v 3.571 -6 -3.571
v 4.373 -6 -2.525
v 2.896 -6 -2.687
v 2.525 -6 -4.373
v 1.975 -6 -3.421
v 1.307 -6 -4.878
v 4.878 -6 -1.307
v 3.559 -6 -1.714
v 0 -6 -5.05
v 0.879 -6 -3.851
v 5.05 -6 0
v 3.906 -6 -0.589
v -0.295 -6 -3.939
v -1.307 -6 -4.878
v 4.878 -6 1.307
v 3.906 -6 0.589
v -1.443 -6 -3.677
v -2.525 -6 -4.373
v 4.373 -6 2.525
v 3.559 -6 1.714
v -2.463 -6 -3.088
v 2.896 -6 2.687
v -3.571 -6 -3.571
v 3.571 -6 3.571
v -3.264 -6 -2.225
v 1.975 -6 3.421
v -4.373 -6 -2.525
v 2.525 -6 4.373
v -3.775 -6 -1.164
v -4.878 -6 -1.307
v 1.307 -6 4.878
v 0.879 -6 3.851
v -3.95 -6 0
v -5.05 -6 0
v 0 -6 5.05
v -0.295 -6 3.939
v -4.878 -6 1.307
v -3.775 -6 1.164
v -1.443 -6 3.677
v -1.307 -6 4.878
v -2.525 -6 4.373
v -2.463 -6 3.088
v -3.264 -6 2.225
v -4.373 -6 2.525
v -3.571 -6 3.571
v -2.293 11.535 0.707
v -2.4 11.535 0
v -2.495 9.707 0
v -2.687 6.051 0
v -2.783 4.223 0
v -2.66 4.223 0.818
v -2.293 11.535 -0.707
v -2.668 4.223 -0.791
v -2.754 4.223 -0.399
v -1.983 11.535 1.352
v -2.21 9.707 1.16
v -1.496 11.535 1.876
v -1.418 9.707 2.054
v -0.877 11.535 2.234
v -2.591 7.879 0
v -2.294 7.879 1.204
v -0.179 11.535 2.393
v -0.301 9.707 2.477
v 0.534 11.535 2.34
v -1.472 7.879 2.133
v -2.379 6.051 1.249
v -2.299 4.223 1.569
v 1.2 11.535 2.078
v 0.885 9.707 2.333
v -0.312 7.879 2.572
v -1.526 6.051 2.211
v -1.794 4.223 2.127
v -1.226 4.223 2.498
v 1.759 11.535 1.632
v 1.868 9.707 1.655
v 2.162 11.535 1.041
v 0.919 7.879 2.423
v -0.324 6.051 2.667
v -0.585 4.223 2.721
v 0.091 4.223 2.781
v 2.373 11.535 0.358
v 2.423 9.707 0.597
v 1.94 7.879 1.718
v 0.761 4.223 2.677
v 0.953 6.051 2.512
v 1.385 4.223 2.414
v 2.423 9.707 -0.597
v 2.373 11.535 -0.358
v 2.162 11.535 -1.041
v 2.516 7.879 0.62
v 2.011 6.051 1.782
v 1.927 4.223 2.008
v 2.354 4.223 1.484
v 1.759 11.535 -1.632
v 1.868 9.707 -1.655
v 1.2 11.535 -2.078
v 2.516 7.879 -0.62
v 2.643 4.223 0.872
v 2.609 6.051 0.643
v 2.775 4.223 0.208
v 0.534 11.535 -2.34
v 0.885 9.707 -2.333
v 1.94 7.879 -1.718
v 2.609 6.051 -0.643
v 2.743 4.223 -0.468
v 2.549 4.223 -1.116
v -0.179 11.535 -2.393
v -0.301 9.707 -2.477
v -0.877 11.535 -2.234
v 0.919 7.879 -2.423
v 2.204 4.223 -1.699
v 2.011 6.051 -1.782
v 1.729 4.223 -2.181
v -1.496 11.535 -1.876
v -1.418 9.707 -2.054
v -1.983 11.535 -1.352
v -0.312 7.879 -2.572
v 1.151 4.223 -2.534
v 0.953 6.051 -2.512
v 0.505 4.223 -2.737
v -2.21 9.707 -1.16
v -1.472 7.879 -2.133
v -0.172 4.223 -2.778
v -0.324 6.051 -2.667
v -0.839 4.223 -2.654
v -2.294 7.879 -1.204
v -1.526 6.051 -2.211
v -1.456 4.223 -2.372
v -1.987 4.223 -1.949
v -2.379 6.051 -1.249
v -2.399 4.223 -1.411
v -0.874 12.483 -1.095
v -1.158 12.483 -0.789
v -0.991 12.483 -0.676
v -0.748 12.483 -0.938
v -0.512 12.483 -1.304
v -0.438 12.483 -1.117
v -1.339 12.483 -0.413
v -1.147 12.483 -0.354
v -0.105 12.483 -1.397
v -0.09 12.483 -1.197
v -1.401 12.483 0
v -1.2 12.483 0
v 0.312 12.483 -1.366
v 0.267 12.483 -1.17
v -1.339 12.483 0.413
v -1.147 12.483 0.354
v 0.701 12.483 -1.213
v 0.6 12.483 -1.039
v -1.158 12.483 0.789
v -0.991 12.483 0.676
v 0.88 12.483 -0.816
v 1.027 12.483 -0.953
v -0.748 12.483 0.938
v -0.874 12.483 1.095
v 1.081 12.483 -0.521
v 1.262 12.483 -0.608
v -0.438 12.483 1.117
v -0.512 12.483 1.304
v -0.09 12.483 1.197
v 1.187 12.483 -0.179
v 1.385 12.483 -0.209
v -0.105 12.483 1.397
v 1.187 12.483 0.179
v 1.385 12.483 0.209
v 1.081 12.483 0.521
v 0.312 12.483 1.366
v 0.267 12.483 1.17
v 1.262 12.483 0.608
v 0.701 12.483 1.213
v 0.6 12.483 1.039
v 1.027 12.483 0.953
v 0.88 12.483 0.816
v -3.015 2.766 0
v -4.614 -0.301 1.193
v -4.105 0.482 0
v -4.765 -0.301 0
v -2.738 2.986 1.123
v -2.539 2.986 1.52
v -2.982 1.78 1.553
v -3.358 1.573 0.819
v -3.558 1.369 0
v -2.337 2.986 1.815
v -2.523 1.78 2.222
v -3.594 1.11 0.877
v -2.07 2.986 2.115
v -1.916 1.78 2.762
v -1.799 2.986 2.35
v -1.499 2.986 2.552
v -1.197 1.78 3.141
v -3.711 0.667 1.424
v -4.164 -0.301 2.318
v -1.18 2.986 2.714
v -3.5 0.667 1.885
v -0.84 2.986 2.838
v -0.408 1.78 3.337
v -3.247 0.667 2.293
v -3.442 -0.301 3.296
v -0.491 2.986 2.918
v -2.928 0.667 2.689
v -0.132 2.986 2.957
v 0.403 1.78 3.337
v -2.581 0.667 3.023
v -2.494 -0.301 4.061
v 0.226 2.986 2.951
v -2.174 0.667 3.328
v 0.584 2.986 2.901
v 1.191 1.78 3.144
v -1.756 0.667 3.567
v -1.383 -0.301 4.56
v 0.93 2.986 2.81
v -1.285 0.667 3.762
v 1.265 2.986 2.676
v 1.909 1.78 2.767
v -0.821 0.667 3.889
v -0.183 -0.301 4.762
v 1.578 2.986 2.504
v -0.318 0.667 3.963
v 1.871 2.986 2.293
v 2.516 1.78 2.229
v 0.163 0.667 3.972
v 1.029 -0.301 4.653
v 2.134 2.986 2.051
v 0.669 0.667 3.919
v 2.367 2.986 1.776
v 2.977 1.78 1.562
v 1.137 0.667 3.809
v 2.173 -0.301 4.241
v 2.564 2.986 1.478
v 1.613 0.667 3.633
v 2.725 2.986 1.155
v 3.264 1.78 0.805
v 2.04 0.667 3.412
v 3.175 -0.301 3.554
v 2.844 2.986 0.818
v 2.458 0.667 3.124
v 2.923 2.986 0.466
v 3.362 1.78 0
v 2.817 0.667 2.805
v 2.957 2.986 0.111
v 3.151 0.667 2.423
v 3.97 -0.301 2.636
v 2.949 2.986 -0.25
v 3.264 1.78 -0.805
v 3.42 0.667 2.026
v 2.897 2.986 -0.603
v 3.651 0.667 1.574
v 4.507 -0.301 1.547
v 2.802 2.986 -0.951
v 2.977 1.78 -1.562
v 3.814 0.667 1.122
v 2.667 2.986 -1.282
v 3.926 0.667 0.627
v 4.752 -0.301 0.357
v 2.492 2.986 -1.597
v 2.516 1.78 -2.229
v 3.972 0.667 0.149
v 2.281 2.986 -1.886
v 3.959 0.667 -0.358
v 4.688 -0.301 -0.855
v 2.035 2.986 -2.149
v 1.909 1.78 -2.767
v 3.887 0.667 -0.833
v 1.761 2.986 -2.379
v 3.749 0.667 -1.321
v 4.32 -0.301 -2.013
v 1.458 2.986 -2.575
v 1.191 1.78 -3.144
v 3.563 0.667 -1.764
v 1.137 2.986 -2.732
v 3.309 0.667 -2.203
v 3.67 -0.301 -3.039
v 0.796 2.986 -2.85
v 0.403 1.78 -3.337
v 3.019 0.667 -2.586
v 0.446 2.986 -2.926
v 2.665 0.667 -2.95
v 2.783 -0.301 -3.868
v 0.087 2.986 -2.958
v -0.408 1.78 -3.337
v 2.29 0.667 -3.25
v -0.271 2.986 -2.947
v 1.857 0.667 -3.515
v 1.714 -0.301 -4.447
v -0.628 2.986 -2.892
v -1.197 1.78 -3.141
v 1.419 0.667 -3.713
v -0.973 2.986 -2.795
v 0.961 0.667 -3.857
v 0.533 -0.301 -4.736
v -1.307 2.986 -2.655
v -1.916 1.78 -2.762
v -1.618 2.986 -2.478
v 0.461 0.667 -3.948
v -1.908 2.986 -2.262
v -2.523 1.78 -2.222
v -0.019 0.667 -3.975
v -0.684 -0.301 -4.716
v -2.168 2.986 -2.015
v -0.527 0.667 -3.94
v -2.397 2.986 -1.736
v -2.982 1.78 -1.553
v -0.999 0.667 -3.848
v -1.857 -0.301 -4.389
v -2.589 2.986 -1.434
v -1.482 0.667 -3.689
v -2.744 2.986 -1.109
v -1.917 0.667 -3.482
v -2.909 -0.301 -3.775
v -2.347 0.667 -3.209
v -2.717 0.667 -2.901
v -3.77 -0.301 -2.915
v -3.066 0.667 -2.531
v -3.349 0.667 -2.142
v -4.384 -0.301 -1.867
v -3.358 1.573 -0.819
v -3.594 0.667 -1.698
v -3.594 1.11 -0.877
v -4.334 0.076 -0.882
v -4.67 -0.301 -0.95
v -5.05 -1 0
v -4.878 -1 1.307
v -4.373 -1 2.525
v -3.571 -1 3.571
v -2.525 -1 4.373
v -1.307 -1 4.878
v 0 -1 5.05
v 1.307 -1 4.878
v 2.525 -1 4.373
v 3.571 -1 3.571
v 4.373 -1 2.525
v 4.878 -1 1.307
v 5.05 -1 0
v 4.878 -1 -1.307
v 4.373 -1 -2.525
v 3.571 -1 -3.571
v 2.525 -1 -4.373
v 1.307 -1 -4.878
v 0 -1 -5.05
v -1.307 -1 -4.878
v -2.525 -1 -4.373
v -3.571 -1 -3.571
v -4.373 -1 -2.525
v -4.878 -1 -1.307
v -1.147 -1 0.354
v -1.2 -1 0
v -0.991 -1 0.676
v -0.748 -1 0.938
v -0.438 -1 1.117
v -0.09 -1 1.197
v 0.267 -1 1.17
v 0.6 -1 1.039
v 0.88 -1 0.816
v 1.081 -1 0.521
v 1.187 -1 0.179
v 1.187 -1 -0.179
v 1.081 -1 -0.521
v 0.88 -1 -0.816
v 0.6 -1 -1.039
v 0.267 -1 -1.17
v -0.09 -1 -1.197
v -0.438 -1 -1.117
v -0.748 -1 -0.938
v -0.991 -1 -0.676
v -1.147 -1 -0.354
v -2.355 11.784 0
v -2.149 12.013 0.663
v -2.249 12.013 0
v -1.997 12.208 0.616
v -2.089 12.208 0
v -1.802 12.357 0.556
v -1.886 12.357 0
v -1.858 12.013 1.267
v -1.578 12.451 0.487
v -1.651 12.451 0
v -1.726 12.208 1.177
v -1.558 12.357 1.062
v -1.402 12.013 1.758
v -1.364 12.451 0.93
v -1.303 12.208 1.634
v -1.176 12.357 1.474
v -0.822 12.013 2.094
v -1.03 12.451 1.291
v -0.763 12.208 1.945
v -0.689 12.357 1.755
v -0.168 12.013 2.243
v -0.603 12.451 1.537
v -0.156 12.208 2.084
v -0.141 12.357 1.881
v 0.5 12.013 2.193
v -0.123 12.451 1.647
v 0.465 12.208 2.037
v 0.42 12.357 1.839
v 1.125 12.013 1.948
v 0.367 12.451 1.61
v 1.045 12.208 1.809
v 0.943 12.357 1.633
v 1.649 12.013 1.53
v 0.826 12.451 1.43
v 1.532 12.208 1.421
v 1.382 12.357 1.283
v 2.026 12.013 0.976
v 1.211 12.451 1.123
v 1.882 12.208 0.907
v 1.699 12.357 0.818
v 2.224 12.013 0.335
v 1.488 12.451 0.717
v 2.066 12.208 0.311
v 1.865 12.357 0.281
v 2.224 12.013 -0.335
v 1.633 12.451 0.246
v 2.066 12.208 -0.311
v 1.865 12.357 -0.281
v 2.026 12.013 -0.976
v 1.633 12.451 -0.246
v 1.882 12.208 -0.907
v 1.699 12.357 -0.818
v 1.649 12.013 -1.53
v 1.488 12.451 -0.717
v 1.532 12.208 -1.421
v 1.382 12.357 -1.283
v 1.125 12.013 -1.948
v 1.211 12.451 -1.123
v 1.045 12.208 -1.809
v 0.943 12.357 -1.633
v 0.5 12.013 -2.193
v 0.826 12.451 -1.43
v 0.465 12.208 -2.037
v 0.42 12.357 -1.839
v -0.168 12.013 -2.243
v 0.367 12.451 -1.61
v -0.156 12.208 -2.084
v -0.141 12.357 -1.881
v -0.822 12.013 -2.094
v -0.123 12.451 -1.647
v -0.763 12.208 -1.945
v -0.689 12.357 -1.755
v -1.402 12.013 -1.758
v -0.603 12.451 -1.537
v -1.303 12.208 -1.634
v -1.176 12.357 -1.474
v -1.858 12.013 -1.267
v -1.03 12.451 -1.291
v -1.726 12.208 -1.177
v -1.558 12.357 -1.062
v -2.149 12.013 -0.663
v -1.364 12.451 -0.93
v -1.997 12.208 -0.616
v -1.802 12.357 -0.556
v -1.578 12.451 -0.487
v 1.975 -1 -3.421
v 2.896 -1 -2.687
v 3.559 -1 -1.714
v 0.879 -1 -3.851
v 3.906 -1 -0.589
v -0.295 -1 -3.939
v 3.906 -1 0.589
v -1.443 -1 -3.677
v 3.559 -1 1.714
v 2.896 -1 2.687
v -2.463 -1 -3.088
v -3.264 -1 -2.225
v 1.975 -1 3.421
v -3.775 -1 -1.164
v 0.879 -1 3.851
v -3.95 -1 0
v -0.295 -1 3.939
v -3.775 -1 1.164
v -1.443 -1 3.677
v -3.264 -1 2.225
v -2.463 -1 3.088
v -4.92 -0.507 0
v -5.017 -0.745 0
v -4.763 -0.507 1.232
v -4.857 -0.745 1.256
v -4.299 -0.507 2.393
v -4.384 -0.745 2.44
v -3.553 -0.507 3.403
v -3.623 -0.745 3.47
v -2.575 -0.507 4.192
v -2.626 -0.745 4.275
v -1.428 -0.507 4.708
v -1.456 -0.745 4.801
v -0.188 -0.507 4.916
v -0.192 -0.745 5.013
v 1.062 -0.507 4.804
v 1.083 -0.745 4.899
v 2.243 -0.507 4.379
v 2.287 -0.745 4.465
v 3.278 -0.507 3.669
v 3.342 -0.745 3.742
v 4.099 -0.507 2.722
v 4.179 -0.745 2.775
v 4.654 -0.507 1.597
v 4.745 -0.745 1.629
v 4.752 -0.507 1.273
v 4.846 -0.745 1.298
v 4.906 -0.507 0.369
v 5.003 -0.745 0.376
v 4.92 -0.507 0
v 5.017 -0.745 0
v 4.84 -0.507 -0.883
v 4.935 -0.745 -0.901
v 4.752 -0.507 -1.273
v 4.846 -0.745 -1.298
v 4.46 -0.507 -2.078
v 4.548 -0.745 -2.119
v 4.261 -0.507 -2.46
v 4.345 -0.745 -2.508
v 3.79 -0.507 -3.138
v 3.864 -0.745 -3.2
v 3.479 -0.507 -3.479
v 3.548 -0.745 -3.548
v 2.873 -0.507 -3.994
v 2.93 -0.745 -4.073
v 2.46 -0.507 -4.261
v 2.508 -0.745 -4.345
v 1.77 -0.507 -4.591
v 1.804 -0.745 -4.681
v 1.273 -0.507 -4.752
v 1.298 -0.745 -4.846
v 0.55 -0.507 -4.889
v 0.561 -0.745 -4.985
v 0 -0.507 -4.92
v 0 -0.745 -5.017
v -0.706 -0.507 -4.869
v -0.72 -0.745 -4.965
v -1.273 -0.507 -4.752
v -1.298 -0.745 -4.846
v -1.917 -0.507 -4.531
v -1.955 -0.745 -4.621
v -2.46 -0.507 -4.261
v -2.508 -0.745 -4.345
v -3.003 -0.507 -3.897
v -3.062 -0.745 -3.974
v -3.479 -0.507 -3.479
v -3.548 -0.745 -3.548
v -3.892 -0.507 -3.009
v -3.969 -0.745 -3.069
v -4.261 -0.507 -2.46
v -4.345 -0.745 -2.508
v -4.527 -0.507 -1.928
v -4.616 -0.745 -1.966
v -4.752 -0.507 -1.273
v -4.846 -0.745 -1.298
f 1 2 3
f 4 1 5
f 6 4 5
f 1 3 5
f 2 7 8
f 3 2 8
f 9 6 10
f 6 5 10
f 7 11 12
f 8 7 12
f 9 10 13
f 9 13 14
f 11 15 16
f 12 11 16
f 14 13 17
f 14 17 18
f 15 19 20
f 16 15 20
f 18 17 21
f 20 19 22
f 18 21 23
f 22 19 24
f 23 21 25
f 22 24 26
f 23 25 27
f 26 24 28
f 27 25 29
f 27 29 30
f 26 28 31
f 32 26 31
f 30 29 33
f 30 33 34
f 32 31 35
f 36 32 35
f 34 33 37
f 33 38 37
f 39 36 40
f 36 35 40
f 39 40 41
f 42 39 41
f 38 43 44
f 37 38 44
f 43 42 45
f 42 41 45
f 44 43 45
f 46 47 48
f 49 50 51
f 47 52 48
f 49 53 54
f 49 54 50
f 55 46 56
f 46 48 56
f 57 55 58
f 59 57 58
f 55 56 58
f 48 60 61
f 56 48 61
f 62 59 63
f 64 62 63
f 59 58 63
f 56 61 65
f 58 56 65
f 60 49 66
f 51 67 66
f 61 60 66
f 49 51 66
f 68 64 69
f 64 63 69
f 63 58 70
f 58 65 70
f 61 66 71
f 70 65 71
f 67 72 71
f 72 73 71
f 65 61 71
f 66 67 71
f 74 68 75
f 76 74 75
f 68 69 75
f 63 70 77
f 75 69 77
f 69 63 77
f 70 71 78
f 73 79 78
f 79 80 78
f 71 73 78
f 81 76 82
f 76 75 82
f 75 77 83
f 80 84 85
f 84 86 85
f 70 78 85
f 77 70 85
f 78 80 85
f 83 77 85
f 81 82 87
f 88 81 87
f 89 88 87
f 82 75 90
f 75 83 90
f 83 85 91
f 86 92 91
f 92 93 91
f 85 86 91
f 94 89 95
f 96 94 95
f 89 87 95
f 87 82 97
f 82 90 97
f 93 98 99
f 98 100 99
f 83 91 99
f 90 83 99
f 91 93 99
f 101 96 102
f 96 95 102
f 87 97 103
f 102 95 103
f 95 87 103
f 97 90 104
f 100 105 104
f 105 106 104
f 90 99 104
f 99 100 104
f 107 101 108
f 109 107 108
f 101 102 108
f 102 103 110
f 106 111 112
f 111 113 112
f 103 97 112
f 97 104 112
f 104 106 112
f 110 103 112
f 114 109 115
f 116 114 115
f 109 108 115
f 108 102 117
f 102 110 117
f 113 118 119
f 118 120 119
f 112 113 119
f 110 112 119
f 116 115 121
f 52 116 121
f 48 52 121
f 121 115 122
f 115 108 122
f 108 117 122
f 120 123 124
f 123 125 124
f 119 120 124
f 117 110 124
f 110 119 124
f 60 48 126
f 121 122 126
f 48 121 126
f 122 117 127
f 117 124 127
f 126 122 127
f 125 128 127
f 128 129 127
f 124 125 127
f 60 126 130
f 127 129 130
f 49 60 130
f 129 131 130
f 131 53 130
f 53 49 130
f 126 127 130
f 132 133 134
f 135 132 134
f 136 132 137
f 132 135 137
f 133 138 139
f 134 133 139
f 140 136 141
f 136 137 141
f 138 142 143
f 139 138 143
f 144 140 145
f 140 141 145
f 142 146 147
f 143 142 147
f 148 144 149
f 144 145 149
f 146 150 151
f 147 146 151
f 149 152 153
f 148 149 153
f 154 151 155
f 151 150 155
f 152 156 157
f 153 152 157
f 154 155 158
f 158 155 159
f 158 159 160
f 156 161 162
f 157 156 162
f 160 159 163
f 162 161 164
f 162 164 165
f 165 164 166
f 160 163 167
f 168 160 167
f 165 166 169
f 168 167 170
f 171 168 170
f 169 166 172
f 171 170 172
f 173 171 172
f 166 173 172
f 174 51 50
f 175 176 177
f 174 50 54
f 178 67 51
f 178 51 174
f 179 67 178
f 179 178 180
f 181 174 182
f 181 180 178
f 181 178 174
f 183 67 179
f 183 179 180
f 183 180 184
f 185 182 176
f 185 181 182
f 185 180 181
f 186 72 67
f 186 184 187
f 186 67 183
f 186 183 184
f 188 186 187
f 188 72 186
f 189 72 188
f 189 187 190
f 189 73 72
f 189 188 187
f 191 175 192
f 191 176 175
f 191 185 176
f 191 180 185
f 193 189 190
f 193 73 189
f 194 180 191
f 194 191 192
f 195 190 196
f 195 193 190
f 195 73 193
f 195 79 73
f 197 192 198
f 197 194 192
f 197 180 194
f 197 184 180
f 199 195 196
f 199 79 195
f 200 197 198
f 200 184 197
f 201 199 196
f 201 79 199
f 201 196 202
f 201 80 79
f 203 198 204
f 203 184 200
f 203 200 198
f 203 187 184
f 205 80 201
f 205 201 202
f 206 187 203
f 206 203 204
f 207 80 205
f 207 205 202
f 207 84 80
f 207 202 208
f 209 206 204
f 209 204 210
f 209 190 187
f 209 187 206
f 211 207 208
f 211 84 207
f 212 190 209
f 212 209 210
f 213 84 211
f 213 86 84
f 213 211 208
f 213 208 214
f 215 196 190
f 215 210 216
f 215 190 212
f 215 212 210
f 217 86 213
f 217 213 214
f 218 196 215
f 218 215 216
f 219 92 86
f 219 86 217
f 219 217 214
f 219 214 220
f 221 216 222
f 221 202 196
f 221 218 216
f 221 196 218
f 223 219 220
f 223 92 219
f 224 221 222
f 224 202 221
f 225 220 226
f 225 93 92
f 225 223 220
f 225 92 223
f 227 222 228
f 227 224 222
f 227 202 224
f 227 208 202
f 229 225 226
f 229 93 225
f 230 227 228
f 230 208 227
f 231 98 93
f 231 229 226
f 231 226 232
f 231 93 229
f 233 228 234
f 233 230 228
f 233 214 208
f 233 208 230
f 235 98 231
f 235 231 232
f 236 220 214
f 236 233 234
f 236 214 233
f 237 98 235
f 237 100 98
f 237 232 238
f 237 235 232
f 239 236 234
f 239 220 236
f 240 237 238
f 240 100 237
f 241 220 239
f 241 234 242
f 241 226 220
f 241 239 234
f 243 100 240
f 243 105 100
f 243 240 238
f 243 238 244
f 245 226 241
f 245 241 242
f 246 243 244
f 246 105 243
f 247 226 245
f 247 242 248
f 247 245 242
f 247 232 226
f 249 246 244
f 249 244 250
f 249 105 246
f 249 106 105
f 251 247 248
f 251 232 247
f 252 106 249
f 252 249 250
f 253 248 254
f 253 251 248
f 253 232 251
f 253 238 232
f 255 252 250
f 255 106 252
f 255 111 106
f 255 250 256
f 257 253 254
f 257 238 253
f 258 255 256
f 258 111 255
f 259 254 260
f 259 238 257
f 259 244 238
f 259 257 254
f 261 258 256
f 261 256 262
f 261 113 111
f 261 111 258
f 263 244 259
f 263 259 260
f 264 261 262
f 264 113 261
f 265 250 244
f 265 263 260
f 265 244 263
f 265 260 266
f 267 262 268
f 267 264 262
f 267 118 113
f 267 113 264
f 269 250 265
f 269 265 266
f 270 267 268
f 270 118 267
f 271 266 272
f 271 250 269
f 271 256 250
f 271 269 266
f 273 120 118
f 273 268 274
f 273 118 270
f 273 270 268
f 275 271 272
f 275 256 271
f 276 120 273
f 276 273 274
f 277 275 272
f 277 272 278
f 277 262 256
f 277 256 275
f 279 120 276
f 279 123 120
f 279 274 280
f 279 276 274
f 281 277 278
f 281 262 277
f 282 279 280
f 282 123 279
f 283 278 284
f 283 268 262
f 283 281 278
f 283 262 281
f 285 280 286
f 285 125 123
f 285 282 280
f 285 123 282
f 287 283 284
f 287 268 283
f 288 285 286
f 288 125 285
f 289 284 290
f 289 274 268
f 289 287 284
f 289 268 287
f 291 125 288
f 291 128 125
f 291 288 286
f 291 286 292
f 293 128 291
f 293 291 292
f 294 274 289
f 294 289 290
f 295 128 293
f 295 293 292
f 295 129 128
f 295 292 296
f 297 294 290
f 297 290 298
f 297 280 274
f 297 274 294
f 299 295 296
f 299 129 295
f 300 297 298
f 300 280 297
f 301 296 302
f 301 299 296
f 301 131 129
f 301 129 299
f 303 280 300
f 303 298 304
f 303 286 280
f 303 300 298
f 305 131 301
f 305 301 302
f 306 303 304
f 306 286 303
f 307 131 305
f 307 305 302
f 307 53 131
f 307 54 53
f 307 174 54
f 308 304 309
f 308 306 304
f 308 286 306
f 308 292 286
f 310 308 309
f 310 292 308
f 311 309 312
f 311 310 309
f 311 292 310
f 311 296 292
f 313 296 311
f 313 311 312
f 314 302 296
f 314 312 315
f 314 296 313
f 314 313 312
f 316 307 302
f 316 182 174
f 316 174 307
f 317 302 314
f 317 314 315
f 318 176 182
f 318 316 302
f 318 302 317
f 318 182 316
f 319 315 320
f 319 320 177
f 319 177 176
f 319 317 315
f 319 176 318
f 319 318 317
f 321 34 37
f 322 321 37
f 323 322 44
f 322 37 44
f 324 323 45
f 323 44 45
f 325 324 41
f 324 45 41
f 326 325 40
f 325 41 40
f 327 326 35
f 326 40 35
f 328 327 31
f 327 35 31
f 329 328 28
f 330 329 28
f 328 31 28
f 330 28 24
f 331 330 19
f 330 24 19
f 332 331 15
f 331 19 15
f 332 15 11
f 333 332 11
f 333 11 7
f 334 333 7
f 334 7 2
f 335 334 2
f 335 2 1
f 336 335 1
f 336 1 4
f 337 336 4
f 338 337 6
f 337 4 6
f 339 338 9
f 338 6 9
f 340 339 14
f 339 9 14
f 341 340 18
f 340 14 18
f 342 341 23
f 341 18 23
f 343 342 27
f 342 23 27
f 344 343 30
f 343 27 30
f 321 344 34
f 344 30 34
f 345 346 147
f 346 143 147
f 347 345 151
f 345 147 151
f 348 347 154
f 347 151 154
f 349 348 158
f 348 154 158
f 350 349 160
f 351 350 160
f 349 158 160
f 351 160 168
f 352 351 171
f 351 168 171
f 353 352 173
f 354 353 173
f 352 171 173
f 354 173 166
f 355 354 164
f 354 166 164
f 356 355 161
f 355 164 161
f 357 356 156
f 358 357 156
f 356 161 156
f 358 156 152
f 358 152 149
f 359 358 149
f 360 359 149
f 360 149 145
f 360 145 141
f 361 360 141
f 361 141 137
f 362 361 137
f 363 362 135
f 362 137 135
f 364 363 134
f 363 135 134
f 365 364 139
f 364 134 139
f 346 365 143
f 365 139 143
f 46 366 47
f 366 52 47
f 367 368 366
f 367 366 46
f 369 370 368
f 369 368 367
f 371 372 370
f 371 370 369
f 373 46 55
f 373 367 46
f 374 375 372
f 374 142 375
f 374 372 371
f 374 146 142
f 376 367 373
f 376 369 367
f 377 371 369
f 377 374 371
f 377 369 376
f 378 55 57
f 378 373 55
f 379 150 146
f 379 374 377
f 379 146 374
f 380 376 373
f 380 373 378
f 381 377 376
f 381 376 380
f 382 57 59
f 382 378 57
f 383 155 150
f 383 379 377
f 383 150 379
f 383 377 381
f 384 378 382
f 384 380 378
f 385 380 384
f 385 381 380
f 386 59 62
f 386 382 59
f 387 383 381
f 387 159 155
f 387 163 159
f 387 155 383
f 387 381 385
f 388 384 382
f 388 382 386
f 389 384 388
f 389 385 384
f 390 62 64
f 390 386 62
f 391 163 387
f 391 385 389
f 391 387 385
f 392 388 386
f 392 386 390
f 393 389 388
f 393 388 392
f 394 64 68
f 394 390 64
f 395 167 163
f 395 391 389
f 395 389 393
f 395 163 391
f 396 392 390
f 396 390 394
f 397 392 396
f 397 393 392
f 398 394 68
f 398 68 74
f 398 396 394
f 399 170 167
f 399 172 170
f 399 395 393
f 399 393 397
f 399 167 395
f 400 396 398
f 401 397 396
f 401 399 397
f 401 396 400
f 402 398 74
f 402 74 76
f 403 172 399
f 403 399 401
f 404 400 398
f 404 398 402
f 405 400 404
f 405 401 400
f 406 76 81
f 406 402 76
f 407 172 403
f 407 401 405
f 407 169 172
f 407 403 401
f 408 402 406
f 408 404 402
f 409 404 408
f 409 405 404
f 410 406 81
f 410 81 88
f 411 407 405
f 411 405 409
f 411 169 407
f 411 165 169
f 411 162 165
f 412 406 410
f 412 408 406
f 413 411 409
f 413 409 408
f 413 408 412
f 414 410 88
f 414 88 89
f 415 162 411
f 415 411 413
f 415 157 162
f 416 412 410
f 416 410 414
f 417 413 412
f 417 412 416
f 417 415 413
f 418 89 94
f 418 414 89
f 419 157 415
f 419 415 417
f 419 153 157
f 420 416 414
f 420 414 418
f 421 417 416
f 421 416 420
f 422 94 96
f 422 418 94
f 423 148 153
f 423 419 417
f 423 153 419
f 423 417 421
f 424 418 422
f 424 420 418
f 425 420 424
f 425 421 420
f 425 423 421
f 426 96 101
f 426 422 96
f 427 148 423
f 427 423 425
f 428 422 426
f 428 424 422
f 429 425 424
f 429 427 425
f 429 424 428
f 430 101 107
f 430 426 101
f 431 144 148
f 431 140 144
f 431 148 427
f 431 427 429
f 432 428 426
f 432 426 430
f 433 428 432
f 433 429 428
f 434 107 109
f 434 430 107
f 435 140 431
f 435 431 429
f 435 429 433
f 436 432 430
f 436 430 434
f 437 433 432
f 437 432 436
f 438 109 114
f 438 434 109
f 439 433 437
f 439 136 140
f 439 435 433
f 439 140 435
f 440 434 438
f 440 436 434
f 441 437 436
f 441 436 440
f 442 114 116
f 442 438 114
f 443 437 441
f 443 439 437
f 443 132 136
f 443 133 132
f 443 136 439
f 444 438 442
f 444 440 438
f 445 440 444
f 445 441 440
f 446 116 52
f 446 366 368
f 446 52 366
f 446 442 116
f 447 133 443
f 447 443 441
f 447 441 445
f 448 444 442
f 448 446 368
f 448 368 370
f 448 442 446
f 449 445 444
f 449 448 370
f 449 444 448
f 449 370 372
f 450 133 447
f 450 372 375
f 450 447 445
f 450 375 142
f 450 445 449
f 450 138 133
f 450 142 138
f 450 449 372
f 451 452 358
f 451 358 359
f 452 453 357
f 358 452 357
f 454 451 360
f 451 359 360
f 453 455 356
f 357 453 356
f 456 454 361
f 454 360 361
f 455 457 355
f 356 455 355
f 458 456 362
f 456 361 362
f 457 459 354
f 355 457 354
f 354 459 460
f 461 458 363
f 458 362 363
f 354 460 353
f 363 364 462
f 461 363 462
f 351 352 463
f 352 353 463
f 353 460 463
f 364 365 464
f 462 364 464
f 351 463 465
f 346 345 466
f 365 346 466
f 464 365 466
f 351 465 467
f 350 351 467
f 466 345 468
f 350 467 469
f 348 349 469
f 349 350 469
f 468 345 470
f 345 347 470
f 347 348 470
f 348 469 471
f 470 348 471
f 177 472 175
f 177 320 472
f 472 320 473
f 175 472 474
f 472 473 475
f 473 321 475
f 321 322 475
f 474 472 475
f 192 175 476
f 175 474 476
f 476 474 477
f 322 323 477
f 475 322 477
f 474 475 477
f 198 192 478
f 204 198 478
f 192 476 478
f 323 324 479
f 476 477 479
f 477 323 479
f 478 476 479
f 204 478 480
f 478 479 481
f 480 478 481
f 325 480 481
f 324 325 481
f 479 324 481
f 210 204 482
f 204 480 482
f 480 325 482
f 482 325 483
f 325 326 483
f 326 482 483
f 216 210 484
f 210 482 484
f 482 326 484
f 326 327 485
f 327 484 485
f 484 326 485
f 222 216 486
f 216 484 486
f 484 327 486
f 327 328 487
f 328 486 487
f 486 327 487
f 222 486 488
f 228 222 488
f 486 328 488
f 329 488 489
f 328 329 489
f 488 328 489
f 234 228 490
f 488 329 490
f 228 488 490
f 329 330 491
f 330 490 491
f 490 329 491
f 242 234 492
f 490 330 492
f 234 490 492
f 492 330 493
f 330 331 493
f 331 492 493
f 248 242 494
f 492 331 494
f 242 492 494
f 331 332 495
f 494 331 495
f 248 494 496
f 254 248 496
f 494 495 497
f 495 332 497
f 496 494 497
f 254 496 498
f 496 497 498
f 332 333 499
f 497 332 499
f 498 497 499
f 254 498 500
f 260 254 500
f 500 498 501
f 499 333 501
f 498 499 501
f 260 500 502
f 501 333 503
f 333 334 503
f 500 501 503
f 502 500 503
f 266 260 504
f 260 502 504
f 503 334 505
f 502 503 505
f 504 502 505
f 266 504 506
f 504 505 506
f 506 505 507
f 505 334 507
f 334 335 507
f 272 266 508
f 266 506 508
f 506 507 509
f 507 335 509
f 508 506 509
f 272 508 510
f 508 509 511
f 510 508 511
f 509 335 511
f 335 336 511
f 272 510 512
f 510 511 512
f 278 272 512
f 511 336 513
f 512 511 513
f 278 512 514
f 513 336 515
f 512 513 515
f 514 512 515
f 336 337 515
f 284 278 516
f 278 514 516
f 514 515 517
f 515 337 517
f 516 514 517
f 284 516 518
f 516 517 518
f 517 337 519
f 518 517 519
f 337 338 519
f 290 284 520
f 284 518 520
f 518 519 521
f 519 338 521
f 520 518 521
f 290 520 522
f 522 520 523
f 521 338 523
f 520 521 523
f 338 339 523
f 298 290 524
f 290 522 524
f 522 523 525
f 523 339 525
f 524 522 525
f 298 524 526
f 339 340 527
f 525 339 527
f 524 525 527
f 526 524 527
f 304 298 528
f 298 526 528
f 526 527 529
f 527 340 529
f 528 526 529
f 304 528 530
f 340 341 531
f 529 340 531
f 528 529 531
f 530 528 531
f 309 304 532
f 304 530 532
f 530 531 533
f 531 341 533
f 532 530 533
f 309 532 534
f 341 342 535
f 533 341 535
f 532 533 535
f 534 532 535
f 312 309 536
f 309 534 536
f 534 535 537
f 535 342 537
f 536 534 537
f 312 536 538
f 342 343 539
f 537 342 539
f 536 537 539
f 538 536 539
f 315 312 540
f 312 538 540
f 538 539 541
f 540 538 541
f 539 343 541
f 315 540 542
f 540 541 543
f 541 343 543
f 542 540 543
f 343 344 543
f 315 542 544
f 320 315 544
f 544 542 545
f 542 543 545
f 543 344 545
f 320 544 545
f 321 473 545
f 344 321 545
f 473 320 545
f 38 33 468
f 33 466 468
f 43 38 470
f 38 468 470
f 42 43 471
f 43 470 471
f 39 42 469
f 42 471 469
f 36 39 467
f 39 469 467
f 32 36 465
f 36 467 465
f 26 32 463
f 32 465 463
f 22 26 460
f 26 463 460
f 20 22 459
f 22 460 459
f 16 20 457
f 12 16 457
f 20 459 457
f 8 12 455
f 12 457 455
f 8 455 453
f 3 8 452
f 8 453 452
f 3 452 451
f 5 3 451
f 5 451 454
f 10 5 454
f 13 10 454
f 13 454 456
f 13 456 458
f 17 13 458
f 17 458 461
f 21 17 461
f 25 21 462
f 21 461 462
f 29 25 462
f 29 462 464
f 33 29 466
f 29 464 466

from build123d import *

# Parameters (mm, degrees)
FILLET1_R = 1
FILLET2_R = 7


with BuildPart() as part:
    # Sketch1 → Revolve1 (revolve)
    with BuildSketch(Plane.XY):
        Polygon((-2.35, 12.482869184), (-3.004199453, 0), (-5.05, 0), (-5.05, -6), (-3.95, -6), (-3.95, -1), (-1.2, -1), (-1.2, 12.482869184), align=None)
    revolve(axis=Axis((0, -1000, 0), (0, 1, 0)))

    # Fillet1
    fillet1_edges = [part.edges().sort_by_distance(p)[0] for p in [
        (2.35, 12.482869184, 0),
        (5.05, 0, 0),
    ]]
    fillet(fillet1_edges, radius=FILLET1_R)

    # Fillet2
    fillet2_edges = [part.edges().sort_by_distance(p)[0] for p in [
        (3.004199453, 0, 0),
    ]]
    fillet(fillet2_edges, radius=FILLET2_R)


solid = part.part
